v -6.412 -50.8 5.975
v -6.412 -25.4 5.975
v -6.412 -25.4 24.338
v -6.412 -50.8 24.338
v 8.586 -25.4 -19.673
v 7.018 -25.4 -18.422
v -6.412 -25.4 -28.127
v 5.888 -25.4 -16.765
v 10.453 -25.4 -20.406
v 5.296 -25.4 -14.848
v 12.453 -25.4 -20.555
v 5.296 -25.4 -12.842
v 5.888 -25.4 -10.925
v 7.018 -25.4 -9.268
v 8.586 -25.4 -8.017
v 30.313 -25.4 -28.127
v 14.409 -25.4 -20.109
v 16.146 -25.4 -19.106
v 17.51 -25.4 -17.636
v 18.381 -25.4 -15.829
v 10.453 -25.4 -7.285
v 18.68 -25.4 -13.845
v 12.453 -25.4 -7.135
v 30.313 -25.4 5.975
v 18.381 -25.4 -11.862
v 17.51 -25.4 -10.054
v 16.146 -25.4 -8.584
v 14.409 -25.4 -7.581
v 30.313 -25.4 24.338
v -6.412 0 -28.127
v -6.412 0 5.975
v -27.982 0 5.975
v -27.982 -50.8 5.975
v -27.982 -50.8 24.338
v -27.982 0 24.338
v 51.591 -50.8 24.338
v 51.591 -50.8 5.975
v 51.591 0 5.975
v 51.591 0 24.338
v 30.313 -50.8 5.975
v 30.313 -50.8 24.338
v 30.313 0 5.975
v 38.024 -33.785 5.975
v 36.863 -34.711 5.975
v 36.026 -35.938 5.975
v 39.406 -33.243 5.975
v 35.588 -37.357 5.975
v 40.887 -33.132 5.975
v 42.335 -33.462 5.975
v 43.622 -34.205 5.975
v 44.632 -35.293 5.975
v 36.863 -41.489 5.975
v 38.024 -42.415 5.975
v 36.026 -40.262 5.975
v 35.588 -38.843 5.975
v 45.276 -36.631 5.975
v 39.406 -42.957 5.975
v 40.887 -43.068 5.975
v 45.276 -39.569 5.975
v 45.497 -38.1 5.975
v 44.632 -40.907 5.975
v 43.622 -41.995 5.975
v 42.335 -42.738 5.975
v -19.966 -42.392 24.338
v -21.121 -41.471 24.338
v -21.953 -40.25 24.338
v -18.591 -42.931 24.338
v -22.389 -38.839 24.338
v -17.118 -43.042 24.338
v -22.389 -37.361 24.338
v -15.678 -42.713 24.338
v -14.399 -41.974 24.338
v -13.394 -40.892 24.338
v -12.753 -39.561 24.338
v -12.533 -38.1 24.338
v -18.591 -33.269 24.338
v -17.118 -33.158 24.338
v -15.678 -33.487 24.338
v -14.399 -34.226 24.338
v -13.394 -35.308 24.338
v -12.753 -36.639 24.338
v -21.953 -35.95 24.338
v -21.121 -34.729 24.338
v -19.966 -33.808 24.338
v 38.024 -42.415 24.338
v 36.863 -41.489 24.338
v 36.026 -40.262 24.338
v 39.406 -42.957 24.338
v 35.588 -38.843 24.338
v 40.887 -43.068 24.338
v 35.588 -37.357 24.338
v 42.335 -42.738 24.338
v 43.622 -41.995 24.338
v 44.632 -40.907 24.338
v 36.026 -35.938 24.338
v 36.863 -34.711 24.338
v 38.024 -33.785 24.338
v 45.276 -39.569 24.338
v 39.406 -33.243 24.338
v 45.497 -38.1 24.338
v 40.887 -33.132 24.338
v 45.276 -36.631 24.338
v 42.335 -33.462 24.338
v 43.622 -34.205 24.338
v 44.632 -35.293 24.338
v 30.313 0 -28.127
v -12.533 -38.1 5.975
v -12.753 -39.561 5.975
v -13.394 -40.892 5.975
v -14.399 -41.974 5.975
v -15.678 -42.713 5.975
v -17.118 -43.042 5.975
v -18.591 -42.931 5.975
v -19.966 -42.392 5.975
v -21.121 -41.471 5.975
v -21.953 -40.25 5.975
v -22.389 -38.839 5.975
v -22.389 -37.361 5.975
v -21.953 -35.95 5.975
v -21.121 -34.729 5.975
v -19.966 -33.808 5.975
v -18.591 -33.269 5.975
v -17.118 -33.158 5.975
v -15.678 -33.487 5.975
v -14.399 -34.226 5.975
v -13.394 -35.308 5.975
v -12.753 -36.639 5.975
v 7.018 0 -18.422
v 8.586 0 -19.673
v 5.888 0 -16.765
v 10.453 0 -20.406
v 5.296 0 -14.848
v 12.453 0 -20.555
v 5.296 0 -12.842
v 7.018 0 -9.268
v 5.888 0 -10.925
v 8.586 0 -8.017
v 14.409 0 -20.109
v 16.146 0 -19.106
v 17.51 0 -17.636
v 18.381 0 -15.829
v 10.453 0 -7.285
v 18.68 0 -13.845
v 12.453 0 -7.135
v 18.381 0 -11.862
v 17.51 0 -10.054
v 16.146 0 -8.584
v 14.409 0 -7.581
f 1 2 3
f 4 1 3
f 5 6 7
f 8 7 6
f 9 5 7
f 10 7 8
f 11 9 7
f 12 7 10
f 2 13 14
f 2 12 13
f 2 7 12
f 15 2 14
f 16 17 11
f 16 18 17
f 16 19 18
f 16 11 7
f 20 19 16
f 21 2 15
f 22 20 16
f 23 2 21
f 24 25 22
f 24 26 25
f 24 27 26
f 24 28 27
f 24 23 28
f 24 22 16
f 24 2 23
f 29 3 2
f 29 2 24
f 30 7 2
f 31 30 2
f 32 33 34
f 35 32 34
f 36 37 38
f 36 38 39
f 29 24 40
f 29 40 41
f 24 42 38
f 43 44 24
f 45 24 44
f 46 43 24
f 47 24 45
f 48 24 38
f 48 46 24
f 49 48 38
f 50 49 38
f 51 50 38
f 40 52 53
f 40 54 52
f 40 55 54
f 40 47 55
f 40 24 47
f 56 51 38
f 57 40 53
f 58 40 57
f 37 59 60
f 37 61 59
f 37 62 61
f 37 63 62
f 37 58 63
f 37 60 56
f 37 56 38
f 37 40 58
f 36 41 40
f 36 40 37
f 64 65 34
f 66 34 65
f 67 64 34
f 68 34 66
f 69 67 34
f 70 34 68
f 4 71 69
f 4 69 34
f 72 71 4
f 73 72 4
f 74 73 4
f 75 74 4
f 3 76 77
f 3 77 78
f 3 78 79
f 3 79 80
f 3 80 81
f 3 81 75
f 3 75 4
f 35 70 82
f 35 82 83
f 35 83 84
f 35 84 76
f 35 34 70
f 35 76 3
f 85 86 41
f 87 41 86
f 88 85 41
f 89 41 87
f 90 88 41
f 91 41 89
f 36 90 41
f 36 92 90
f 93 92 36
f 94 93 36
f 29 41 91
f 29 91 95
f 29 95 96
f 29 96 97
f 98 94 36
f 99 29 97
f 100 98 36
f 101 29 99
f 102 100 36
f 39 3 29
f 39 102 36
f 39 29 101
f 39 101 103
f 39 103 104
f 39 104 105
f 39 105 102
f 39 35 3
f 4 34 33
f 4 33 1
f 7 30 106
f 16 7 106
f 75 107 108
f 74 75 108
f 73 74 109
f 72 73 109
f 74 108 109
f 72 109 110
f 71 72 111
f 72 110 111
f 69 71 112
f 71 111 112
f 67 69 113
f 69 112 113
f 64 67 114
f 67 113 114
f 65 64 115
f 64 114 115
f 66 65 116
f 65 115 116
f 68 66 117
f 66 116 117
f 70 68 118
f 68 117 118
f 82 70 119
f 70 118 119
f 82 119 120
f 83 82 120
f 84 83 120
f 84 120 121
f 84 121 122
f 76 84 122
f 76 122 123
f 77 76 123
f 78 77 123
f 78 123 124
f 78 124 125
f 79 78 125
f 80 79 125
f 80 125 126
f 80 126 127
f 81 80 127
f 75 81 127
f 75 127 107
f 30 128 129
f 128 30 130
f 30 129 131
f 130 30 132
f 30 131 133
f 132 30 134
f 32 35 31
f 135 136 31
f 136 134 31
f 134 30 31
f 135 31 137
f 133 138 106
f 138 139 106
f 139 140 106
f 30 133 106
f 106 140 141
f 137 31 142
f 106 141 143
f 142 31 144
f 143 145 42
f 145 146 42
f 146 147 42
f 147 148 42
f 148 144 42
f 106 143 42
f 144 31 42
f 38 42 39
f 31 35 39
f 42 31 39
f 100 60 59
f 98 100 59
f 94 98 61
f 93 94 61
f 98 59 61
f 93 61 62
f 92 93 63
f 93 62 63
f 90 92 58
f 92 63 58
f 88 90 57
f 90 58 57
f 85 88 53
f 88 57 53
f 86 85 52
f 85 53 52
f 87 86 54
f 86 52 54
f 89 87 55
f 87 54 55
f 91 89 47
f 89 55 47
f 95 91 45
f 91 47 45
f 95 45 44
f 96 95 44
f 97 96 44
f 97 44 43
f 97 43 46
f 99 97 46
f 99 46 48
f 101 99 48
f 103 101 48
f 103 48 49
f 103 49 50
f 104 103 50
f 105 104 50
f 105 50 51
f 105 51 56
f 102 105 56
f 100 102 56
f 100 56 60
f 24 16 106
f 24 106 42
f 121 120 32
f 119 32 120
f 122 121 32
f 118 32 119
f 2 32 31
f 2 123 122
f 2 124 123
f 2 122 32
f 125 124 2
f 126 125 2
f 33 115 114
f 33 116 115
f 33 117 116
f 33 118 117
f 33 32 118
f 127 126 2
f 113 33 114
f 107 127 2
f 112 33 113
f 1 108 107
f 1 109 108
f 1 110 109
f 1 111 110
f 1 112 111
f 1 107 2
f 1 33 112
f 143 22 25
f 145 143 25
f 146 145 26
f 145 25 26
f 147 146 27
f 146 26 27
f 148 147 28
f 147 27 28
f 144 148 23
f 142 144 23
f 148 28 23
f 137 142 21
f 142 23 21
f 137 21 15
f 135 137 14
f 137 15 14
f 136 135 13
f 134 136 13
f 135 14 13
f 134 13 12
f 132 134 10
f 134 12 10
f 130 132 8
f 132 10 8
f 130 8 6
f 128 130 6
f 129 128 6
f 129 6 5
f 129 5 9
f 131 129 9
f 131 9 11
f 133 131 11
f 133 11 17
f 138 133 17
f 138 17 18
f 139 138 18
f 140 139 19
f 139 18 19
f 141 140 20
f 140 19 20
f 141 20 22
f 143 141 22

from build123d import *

# Parameters (mm, degrees)
F0_W      = 79.5727856457
F0_H      = 52.4655748159
F1_DEPTH  = 25.4
F2_W      = 21.5691803023
F2_H      = 18.3629509993
F2_W_2    = 21.2777052075
F3_DEPTH  = 25.4
F4_W      = 21.5691803023
F4_H      = 34.1026238166
F4_W_2    = 21.2777052075
F5_DEPTH  = 25.4
F6_R      = 6.7292329965
F7_DEPTH  = 25.4
F8_R      = 4.9554758181
F9_DEPTH  = 25.4
F10_R     = 4.9823414423
F11_DEPTH = 25.4


with BuildPart() as f1:
    # F0 (on Front) → F1 (new body)
    with BuildSketch(Plane.XZ):
        with Locations((11.8047539145, -1.8945904449)):
            Rectangle(F0_W, F0_H)
    extrude(amount=F1_DEPTH)

    # F2 (on face) → F3 (join)
    with BuildSketch(Plane.XZ.offset(25.4)):
        with Locations((-17.1970487572, 15.1567214634)):
            Rectangle(F2_W, F2_H)
        with Locations((40.9522941336, 15.1567214634)):
            Rectangle(F2_W_2, F2_H)
    extrude(amount=F3_DEPTH)

    # F4 (on face) → F5 (cut)
    with BuildSketch(Plane.XZ.offset(25.4)):
        with Locations((-17.1970487572, -11.0760659445)):
            Rectangle(F4_W, F4_H)
        with Locations((40.9522941336, -11.0760659445)):
            Rectangle(F4_W_2, F4_H)
    extrude(amount=-F5_DEPTH, mode=Mode.SUBTRACT)

    # F6 (on face) → F7 (cut)
    with BuildSketch(Plane.XZ.offset(25.4)):
        with Locations((11.9504914619, -13.8450823724)):
            Circle(F6_R)
    extrude(amount=-F7_DEPTH, mode=Mode.SUBTRACT)

    # F8 (on face) → F9 (cut)
    with BuildSketch(Plane(origin=(0, 0, 5.9752459638), x_dir=(1, 0, 0), z_dir=(0, 0, -1))):
        with Locations((-17.4885243177, 38.1)):
            Circle(F8_R)
    extrude(amount=-F9_DEPTH, mode=Mode.SUBTRACT)

    # F10 (on face) → F11 (cut)
    with BuildSketch(Plane(origin=(0, 0, 5.9752459638), x_dir=(1, 0, 0), z_dir=(0, 0, -1))):
        with Locations((40.5150838196, 38.1)):
            Circle(F10_R)
    extrude(amount=-F11_DEPTH, mode=Mode.SUBTRACT)


solid = f1.part
